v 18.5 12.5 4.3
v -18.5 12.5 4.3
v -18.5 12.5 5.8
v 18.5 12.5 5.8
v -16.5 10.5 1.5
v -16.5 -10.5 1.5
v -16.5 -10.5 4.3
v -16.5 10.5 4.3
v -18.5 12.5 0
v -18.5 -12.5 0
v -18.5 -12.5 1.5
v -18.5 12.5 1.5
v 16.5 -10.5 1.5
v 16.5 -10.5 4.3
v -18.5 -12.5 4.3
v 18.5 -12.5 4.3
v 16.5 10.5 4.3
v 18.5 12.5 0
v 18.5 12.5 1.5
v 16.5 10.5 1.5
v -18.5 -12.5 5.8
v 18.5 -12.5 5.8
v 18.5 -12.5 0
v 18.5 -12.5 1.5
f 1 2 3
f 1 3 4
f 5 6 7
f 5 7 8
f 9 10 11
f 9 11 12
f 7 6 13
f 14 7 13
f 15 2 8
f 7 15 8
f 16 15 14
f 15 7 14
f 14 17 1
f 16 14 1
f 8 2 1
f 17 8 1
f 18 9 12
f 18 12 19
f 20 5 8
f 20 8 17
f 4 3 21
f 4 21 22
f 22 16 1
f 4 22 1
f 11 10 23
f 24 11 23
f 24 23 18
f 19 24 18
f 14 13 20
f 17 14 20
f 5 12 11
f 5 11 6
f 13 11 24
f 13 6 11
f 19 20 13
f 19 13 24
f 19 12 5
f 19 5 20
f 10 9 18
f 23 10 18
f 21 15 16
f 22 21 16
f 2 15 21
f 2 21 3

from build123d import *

# Parameters (mm, degrees)
CROQUIS1_W              = 37
CROQUIS1_H              = 25
SALIENTE_EXTRUIR1_DEPTH = 1.5
CROQUIS2_W              = 33
CROQUIS2_H              = 21
SALIENTE_EXTRUIR2_DEPTH = 2.8
SALIENTE_EXTRUIR3_START = 4.3
CROQUIS1_2_W            = 37
CROQUIS1_2_H            = 25
SALIENTE_EXTRUIR3_DEPTH = 1.5


with BuildPart() as part:
    # Croquis1 → Saliente-Extruir1 (new body)
    with BuildSketch(Plane.XY):
        Rectangle(CROQUIS1_W, CROQUIS1_H)
    extrude(amount=SALIENTE_EXTRUIR1_DEPTH)

    # Croquis2 → Saliente-Extruir2 (add)
    with BuildSketch(Plane.XY.offset(1.5)):
        Rectangle(CROQUIS2_W, CROQUIS2_H)
    extrude(amount=SALIENTE_EXTRUIR2_DEPTH)

    # Croquis1<2> → Saliente-Extruir3 (add)
    with BuildSketch(Plane.XY.offset(SALIENTE_EXTRUIR3_START)):
        Rectangle(CROQUIS1_2_W, CROQUIS1_2_H)
    extrude(amount=SALIENTE_EXTRUIR3_DEPTH)


solid = part.part
